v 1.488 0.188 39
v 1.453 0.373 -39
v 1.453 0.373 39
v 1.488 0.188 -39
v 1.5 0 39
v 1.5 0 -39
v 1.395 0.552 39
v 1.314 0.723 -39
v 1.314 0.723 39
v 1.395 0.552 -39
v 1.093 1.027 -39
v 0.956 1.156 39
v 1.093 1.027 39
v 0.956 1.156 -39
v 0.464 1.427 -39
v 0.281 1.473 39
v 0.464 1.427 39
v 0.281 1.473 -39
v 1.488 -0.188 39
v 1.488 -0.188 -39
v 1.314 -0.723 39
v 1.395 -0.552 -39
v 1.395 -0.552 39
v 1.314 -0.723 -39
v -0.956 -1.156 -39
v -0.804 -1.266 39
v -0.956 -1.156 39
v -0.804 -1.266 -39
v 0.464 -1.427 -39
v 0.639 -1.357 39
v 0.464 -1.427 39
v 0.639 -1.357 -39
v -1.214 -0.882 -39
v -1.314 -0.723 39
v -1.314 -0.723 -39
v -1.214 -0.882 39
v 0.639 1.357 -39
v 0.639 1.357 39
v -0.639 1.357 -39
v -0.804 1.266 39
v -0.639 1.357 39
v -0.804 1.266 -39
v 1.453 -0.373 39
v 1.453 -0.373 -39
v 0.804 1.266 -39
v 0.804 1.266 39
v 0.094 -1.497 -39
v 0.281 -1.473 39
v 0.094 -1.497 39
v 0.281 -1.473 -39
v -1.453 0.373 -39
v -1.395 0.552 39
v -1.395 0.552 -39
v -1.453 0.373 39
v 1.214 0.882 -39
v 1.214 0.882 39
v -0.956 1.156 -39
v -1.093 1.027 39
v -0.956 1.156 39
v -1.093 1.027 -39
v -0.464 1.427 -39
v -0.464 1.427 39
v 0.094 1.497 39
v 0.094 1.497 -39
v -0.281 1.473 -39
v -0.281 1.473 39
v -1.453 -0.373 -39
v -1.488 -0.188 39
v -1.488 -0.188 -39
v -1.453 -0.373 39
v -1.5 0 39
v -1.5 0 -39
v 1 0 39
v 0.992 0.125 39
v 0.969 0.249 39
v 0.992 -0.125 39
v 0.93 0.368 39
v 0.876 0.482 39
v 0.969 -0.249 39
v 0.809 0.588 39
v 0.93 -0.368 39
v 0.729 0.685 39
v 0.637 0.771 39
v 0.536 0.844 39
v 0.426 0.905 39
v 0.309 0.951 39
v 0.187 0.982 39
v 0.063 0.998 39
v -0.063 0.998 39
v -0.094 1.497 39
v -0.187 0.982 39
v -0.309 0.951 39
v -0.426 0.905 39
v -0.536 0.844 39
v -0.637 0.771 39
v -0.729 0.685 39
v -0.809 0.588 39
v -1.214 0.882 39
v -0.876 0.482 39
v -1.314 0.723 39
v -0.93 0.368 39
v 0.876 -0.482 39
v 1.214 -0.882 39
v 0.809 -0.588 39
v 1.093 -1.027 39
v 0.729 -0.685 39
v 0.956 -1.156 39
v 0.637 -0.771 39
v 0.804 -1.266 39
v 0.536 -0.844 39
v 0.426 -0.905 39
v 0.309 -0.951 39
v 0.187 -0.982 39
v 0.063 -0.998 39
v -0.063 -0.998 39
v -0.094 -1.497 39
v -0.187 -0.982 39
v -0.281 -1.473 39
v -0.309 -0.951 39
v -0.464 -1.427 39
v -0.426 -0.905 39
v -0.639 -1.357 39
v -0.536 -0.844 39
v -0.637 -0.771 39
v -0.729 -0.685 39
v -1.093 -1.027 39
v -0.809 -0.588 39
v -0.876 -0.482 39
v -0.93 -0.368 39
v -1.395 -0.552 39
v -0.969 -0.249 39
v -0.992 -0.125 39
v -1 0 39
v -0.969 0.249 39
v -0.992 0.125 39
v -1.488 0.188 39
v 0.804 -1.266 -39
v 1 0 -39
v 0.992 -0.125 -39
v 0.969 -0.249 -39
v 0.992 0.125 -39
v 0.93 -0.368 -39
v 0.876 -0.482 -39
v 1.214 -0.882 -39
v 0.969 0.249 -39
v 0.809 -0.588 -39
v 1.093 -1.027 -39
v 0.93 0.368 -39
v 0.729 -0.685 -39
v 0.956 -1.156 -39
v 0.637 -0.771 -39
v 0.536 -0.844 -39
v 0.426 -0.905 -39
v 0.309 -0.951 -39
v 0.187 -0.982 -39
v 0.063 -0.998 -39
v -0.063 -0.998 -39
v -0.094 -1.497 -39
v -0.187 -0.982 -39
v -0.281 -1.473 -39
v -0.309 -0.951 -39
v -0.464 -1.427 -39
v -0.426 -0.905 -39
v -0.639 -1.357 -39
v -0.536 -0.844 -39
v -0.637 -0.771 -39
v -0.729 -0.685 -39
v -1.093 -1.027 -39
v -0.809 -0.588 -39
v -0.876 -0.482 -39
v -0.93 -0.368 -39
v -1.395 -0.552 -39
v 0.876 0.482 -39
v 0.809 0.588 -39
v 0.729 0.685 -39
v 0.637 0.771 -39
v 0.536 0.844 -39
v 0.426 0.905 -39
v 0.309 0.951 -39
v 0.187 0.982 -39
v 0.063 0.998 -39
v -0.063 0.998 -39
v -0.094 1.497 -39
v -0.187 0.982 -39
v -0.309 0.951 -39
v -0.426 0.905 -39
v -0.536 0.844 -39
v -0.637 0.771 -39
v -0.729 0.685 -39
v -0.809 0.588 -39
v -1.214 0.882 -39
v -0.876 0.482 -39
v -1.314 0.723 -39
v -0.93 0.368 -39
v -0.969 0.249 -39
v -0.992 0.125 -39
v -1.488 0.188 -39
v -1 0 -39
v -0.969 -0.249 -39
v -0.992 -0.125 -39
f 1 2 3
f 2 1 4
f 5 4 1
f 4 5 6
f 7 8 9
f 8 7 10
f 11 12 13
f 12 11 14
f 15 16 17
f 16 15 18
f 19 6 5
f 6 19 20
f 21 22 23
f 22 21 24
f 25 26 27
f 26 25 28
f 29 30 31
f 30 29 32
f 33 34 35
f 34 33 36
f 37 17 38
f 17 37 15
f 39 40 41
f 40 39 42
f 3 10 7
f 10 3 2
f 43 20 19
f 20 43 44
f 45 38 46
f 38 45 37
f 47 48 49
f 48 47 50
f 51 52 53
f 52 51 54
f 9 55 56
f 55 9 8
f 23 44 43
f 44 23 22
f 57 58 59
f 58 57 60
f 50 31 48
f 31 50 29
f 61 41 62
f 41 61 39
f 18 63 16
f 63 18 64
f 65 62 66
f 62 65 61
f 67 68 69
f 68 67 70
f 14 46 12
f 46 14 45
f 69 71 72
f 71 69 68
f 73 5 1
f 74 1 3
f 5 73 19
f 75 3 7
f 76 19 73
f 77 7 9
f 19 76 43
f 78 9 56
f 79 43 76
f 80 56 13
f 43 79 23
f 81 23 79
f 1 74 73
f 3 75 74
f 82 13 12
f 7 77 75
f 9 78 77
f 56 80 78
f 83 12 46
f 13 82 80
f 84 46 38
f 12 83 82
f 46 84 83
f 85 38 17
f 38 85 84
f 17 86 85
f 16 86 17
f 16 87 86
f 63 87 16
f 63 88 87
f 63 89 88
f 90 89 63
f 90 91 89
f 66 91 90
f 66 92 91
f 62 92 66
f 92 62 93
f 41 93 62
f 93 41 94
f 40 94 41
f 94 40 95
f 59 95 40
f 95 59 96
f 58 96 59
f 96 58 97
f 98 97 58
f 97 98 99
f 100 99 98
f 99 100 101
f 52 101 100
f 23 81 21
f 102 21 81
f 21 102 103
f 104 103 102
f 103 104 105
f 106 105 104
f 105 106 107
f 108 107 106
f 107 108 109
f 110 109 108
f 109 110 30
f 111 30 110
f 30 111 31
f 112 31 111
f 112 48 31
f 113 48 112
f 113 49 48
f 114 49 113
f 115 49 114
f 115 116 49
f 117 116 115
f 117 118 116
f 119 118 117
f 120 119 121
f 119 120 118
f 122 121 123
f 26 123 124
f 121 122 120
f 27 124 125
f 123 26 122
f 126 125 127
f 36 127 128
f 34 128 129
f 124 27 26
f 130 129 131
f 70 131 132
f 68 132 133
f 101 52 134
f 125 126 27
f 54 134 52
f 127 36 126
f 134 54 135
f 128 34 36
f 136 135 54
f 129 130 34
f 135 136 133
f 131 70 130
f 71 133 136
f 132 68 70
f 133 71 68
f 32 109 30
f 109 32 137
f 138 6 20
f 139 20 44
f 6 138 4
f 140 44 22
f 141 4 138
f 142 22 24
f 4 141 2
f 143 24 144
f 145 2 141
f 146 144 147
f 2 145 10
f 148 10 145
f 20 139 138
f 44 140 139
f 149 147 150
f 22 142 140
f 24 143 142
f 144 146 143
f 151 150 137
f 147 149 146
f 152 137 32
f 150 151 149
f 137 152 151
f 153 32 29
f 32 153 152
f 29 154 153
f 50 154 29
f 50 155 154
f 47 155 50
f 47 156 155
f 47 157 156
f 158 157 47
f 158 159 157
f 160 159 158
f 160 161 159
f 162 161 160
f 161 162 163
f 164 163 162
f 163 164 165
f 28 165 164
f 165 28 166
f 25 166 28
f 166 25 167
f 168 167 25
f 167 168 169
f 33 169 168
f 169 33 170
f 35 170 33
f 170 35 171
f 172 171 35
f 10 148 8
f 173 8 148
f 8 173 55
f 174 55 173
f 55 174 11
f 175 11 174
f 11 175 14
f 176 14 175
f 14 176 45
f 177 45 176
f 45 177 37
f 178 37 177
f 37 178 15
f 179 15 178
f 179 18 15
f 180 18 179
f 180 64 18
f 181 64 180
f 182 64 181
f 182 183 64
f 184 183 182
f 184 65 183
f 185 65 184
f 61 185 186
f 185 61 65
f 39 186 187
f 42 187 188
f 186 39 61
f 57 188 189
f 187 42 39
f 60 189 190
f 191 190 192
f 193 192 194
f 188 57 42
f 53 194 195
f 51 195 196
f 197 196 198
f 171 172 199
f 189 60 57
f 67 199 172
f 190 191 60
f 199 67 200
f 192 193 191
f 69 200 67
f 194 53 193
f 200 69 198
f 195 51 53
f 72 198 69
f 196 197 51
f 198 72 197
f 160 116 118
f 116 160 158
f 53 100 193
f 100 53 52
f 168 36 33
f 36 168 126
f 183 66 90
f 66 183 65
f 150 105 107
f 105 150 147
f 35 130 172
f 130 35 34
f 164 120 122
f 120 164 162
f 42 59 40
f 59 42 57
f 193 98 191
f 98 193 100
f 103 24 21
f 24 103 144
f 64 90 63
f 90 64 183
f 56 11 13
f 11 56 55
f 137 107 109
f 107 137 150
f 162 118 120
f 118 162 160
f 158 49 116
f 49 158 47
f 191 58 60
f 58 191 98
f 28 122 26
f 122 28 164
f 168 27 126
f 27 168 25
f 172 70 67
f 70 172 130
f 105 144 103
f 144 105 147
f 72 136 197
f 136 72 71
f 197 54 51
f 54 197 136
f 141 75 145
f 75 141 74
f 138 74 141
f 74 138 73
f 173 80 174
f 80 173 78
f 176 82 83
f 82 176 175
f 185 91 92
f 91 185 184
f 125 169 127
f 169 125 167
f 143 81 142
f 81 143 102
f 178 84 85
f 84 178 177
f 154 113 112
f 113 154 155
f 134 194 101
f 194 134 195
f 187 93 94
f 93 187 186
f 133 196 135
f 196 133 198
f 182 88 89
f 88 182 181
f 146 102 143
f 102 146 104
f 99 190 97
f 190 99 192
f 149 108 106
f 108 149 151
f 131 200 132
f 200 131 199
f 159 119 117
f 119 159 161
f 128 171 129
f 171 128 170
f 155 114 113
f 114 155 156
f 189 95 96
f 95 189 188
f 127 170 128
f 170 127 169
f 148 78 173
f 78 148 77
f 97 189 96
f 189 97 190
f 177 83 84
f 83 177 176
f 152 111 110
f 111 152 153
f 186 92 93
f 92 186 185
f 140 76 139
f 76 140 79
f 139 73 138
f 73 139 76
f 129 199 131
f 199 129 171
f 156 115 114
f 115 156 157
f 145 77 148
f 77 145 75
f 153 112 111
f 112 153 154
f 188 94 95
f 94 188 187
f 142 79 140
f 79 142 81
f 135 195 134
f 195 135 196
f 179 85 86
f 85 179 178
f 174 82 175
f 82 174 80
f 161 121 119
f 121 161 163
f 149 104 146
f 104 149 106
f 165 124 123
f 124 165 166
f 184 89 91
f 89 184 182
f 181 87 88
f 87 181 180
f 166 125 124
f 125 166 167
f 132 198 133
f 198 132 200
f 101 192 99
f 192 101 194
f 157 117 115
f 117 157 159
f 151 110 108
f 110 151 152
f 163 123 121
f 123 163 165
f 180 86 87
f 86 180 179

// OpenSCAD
$fn = 50;


difference() {
	union() {
		translate(v = [0, 0, -39.0000000000]) {
			cylinder(h = 78, r = 1.5000000000);
		}
	}
	union() {
		translate(v = [0, 0, -100.0000000000]) {
			cylinder(h = 200, r = 1.0000000000);
		}
	}
}
